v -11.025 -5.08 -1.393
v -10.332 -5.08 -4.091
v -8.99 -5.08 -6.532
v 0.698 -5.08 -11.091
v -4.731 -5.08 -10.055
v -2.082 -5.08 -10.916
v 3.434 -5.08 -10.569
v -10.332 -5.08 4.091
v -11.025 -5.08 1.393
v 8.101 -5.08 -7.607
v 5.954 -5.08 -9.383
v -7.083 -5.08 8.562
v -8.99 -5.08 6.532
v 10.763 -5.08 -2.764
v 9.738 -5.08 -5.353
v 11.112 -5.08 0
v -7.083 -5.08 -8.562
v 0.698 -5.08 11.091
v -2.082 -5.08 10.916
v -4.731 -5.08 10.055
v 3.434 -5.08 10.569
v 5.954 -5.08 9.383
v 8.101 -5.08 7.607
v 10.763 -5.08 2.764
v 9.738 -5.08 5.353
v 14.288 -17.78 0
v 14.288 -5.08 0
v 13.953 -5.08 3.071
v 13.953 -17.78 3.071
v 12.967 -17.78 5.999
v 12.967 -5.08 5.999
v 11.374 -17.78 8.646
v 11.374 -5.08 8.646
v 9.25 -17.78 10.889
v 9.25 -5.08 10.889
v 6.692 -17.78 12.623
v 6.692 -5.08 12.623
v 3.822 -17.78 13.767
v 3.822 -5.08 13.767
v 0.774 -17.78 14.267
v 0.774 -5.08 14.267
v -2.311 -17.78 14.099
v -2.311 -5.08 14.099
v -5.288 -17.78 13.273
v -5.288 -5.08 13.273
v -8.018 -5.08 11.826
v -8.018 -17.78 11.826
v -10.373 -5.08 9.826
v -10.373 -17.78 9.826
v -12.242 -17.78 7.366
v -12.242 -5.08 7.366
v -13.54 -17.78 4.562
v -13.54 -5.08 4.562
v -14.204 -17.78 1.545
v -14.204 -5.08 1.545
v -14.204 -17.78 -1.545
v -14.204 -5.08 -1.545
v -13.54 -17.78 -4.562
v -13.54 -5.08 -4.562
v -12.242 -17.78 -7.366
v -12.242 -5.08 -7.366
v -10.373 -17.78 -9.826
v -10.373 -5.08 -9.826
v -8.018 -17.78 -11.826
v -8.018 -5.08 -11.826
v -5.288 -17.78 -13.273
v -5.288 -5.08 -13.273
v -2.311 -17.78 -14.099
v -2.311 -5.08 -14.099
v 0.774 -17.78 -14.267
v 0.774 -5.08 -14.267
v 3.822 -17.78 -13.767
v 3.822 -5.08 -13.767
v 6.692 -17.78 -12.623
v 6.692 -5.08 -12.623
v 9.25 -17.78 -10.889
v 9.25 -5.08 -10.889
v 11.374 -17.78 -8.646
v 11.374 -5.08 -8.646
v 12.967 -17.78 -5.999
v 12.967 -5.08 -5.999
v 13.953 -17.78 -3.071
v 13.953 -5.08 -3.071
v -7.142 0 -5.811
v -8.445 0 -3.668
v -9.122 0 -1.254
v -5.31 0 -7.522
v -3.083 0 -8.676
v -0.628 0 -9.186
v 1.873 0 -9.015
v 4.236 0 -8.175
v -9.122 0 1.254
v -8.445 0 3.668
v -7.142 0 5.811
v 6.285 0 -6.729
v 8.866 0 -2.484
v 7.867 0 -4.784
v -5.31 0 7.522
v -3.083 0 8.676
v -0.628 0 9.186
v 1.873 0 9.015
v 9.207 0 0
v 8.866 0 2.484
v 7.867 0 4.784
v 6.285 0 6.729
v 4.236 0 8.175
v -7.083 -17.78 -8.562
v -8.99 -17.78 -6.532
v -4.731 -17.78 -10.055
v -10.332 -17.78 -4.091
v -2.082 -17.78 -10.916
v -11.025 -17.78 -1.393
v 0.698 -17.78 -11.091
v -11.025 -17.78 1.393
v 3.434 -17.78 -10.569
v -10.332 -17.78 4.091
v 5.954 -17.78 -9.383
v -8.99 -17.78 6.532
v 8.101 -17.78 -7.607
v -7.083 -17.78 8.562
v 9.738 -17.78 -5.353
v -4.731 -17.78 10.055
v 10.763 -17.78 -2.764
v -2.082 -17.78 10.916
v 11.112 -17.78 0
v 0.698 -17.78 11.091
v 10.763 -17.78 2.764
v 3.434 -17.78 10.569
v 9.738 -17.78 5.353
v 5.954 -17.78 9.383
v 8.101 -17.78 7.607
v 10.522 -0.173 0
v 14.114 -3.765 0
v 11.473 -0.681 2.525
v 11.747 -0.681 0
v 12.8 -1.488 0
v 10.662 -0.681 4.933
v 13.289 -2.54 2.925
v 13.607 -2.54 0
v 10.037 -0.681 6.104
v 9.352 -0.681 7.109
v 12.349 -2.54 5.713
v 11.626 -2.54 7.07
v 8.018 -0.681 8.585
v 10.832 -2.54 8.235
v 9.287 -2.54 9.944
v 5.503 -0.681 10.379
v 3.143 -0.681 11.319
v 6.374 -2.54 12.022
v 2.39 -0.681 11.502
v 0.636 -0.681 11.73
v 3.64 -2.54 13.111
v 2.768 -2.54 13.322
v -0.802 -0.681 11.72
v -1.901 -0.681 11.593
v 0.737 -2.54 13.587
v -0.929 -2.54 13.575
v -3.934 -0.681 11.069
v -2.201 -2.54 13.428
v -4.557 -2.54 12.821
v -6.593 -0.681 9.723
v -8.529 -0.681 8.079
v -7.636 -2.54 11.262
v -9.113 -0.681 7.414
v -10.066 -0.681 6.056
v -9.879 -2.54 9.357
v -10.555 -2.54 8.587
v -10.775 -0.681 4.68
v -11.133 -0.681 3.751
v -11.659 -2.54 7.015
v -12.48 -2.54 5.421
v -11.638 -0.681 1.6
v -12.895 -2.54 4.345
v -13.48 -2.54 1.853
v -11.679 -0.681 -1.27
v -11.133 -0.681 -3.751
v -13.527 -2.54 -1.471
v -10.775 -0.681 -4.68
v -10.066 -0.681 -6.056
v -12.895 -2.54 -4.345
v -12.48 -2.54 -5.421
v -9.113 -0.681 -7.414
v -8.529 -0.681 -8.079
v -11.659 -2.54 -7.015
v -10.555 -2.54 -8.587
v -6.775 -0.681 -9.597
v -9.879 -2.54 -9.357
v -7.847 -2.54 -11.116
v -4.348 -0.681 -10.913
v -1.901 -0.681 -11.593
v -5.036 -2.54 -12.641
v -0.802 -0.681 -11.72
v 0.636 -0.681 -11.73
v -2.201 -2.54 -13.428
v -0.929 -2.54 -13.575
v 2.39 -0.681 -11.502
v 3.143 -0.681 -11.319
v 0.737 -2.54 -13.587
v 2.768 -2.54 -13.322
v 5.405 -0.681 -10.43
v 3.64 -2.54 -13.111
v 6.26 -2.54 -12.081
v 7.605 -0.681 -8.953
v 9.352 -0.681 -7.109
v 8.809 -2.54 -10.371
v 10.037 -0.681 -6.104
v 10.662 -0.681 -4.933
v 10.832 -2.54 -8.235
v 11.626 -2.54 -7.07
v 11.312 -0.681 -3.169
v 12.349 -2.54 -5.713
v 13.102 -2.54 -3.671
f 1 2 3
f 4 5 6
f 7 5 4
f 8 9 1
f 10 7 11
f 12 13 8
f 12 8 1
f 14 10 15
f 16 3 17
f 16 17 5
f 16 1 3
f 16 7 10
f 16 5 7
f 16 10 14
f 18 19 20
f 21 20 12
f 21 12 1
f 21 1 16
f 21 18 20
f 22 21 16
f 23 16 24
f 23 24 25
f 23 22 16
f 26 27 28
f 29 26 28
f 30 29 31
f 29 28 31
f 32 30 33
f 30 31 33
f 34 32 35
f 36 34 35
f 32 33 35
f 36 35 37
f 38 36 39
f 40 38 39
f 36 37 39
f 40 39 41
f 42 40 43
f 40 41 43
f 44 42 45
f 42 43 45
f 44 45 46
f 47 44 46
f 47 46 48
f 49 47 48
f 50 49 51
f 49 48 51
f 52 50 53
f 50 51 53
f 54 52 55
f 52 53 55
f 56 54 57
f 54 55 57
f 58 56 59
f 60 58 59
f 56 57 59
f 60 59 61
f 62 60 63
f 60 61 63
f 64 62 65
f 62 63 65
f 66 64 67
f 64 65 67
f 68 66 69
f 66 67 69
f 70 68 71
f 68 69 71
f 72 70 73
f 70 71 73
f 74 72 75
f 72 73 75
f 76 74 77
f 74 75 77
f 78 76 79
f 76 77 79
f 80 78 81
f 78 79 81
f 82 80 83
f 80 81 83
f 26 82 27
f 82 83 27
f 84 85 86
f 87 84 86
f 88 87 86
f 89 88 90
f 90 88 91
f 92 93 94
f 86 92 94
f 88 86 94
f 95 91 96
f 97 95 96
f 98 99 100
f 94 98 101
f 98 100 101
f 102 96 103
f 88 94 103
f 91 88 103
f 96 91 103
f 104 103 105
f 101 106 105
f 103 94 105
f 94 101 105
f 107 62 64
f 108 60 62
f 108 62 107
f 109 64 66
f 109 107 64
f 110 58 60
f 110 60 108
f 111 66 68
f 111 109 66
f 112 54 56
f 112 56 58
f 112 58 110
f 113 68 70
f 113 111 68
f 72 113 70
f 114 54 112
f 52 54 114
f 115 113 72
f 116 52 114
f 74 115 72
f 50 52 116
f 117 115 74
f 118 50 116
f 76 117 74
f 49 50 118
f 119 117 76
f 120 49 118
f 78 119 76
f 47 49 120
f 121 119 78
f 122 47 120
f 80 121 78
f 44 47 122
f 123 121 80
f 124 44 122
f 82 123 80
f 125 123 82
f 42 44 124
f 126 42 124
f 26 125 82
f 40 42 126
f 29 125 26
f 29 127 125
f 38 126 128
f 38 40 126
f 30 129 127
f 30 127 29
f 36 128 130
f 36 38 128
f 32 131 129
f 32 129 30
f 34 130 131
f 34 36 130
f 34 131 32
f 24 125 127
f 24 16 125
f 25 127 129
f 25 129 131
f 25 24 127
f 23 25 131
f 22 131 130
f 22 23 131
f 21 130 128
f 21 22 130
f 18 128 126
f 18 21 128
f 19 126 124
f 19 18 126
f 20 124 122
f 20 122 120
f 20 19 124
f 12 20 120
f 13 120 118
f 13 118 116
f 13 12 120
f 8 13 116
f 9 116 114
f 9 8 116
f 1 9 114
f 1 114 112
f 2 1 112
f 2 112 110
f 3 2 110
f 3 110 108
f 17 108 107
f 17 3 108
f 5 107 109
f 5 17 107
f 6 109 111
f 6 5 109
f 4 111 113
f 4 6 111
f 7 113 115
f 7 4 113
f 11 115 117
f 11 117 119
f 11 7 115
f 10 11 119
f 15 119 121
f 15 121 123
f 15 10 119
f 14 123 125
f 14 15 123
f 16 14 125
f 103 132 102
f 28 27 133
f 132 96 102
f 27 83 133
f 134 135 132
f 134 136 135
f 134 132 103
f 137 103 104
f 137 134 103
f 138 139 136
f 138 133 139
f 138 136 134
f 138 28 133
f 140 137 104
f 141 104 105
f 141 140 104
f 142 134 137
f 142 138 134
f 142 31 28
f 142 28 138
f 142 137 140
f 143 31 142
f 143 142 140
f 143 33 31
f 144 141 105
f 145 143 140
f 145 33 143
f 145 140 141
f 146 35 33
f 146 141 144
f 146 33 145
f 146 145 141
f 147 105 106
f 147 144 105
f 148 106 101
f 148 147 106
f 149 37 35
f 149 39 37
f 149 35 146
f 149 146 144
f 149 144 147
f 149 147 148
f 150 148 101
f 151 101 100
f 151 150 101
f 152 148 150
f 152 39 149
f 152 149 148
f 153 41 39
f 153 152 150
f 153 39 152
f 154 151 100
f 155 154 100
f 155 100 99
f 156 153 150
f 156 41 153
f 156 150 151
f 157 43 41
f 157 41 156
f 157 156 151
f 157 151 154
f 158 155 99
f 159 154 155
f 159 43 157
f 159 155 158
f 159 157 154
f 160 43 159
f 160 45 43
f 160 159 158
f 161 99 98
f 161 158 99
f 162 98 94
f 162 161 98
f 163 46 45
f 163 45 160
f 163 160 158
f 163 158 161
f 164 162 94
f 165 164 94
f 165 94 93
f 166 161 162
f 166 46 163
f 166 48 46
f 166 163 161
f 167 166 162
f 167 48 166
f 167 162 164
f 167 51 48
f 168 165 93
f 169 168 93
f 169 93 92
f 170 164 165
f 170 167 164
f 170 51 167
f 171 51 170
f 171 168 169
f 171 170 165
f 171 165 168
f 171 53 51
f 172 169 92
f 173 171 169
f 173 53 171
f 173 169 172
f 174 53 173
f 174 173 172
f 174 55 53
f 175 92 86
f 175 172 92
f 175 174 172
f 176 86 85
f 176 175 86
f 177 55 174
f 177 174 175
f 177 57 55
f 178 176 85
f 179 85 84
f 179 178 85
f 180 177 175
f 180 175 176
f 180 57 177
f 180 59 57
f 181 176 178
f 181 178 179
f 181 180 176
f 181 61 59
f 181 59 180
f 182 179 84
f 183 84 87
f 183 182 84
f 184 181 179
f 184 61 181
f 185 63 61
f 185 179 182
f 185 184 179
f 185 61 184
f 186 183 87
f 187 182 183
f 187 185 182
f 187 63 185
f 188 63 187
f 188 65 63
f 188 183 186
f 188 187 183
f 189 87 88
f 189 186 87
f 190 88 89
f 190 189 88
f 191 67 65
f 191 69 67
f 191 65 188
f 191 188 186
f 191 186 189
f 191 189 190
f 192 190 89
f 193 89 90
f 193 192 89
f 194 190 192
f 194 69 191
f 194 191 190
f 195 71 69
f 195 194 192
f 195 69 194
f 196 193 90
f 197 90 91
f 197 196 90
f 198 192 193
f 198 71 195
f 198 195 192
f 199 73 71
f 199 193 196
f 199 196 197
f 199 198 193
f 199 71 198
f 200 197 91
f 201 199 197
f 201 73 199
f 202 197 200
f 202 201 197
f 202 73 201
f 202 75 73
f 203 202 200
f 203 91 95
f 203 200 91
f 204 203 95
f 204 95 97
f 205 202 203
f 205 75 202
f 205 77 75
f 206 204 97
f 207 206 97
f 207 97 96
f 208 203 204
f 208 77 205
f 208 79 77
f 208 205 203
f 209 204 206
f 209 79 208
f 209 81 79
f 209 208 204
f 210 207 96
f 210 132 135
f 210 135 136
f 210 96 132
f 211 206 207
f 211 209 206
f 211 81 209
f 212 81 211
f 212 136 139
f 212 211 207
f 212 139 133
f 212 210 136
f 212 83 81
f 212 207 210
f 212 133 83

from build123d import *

# Parameters (mm, degrees)
F0_R        = 14.2875
F0_R_2      = 11.1125
F1_DEPTH    = 12.7
F1_FACE_R   = 14.2875
F1_FACE_R_2 = 11.1125
F2_DEPTH    = 5.08
F3_R        = 5.08


with BuildPart() as f1:
    # F0 (on Front) → F1 (new body)
    with BuildSketch(Plane.XZ):
        Circle(F0_R)
        Circle(F0_R_2, mode=Mode.SUBTRACT)
    extrude(amount=F1_DEPTH)

    # F0 (on Front) + F1_face (on face) → F2 (join)
    with BuildSketch(Plane.XZ):
        Circle(F0_R_2)
    with BuildSketch(Plane.XZ.offset(12.7)):
        Circle(F1_FACE_R)
        Circle(F1_FACE_R_2, mode=Mode.SUBTRACT)
    extrude(amount=F2_DEPTH)

    # F3
    f3_edges = [f1.edges().sort_by_distance(p)[0] for p in [
        (-14.2875, 0, 0),
    ]]
    fillet(f3_edges, radius=F3_R)


solid = f1.part
